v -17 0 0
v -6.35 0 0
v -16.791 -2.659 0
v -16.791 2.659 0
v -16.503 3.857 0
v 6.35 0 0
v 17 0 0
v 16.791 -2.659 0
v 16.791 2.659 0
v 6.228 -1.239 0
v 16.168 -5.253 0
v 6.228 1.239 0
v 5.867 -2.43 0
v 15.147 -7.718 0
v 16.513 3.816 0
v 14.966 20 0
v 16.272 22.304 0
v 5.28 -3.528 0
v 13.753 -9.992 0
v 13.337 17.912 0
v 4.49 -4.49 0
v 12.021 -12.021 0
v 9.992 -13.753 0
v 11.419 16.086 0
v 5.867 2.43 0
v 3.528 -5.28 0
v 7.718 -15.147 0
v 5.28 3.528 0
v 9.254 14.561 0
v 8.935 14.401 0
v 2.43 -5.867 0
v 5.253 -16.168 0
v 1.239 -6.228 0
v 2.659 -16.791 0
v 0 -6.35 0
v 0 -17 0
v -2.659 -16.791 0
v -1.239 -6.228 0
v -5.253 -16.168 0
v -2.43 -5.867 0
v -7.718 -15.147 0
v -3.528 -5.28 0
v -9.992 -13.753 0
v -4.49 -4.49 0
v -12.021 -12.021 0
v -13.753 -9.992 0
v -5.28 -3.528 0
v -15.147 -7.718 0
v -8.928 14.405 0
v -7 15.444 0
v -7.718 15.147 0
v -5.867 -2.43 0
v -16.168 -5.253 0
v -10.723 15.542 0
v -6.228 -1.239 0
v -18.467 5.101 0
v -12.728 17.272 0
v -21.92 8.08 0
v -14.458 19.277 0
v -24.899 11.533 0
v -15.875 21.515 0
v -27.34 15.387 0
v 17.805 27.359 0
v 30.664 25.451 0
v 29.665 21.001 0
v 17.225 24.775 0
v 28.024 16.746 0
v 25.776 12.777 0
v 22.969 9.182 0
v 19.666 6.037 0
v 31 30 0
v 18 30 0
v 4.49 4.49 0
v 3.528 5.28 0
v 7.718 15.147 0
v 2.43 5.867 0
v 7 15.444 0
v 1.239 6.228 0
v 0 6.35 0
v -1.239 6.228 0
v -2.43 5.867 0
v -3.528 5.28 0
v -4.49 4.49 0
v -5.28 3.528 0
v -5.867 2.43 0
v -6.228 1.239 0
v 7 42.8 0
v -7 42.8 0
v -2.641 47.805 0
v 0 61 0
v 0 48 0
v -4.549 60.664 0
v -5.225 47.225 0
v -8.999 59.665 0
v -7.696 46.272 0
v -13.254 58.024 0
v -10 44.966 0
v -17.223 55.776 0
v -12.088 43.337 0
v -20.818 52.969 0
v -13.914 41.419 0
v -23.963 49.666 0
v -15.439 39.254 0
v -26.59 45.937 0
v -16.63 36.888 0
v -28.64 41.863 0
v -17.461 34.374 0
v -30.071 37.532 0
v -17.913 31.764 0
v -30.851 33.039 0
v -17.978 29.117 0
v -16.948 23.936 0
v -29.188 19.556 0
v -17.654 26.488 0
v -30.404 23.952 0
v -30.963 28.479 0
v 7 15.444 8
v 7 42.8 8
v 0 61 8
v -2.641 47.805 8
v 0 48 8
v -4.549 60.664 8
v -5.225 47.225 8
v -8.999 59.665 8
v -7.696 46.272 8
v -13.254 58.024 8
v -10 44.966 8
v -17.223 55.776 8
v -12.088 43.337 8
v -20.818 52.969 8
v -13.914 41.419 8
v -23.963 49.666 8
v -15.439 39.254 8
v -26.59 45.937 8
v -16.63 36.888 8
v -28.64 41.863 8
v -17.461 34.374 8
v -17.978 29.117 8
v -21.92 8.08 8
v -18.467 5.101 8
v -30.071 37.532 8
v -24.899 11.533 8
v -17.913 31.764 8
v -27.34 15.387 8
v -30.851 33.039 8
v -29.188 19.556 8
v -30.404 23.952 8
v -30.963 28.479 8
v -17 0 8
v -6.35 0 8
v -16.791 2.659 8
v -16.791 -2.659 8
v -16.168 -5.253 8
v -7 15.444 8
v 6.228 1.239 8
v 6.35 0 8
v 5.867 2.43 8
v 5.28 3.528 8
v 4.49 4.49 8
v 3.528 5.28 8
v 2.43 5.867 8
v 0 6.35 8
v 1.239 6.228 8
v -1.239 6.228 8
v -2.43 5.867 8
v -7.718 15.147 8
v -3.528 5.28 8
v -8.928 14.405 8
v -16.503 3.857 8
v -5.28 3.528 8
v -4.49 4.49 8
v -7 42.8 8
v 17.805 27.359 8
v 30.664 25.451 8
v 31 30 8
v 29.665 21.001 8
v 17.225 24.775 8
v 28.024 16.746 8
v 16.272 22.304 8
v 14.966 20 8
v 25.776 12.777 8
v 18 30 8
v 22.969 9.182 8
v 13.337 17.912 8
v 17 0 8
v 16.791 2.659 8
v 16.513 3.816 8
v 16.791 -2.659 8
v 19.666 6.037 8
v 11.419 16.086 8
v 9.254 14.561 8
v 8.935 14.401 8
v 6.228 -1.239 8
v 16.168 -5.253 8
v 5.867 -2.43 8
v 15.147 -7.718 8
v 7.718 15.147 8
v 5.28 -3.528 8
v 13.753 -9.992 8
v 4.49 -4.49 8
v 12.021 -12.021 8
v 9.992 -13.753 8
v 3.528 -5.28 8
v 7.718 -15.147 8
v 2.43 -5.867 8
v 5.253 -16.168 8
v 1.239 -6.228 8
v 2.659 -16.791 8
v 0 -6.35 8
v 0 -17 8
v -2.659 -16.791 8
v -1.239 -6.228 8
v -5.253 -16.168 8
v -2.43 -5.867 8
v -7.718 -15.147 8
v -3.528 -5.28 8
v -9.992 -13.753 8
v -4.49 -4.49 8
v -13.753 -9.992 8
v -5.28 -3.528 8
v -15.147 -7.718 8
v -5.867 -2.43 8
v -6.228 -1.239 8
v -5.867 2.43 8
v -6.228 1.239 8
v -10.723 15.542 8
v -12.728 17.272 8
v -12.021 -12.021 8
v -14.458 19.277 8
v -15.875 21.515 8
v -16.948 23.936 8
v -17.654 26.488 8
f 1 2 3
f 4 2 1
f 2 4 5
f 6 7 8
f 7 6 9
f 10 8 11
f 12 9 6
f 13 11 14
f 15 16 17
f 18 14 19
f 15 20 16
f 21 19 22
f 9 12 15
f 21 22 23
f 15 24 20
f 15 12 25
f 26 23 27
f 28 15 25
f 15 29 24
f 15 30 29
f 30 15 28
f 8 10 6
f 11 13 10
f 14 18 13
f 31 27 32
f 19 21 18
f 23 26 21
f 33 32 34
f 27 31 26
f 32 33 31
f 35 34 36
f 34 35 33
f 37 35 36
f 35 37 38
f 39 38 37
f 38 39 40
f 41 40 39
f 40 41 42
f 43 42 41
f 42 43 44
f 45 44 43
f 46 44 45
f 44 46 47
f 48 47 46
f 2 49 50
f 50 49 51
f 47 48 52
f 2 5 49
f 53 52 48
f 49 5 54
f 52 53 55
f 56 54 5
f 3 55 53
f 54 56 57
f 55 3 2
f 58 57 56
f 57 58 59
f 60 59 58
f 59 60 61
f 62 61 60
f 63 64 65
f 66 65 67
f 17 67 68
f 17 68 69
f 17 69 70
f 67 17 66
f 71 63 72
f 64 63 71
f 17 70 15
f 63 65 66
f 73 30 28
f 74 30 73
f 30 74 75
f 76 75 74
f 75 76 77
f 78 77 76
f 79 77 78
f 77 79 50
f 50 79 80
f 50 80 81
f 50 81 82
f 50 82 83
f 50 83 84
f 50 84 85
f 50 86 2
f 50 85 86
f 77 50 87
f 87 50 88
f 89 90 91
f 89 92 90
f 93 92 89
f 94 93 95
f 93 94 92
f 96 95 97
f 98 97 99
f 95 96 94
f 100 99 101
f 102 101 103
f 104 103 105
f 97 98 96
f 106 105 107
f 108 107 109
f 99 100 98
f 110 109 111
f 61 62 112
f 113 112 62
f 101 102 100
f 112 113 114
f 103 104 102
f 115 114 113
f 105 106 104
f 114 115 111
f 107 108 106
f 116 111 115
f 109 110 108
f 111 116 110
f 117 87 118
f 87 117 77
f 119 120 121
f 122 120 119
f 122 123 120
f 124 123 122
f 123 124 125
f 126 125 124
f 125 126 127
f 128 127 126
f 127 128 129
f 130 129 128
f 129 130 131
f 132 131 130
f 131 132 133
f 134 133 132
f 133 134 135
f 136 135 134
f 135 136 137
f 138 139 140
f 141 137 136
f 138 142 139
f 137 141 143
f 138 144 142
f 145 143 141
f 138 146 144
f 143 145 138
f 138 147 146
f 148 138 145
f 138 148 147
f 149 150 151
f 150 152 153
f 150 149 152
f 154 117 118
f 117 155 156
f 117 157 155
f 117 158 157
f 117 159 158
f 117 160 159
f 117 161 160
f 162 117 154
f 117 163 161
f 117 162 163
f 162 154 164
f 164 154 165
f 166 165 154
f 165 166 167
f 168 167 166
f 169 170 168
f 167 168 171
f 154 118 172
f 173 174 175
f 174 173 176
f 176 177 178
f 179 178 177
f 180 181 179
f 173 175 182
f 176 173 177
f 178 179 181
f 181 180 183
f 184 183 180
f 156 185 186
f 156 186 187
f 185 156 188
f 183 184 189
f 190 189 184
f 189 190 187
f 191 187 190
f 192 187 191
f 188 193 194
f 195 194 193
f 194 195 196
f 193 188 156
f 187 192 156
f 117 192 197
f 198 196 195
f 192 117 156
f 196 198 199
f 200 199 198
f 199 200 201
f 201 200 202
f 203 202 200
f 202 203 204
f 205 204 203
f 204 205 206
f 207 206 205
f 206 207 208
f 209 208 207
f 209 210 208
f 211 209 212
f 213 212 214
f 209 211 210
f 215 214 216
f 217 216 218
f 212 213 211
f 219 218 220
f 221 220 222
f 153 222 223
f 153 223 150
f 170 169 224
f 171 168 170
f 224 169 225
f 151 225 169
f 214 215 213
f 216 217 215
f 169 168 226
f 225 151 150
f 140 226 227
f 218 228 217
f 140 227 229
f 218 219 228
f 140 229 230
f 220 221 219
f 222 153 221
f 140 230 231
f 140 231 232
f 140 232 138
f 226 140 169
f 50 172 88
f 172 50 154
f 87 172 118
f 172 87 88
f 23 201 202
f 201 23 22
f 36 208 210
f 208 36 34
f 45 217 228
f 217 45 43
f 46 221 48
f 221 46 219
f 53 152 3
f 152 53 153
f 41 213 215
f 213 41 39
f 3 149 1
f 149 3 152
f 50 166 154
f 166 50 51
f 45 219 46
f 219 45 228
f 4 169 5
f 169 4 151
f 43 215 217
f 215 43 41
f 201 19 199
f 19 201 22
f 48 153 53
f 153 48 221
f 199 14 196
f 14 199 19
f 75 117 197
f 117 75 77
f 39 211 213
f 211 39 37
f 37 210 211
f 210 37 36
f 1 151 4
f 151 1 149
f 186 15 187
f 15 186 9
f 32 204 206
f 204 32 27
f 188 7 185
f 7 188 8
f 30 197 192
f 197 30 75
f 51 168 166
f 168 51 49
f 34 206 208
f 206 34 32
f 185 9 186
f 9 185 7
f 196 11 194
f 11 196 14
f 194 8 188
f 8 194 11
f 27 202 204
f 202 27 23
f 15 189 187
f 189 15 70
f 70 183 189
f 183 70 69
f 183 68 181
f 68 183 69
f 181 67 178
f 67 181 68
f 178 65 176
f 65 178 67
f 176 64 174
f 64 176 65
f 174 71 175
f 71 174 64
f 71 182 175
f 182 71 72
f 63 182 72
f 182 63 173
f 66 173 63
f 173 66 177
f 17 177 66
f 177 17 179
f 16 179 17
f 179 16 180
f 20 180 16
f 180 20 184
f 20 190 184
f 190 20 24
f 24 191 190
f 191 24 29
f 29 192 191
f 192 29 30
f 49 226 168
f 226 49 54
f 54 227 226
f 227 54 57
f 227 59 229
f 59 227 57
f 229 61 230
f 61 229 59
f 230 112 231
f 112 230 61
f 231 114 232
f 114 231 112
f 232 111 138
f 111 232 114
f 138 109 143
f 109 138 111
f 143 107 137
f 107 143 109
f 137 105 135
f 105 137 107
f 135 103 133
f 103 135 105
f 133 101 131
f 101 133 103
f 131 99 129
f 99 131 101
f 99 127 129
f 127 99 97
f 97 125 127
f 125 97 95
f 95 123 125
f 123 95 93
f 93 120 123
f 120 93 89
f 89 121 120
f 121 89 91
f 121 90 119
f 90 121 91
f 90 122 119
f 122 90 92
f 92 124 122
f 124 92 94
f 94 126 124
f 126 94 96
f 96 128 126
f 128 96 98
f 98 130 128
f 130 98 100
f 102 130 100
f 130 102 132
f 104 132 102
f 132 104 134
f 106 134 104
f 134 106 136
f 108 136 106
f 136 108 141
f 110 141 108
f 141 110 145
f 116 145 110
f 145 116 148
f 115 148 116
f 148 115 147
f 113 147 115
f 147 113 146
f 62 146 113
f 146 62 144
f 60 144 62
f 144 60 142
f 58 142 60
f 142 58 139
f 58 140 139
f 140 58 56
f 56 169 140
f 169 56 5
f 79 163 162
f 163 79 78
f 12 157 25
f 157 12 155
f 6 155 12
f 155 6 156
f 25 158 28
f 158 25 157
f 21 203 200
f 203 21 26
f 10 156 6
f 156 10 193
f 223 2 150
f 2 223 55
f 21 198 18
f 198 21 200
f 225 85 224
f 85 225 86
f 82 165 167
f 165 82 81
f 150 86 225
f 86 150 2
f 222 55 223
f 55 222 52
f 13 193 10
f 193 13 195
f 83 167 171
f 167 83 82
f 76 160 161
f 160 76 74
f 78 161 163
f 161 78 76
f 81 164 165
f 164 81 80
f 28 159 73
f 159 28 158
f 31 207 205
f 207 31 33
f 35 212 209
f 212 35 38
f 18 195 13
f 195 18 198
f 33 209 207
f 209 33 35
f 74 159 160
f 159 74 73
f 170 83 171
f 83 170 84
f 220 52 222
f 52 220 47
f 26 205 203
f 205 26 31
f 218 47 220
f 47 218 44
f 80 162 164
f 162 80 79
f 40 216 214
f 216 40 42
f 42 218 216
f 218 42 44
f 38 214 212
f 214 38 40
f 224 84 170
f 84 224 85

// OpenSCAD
$fn = 32;

// ----------------------------------------------------------------------
// Hook: 60 mm shank into a 18 mm curl, 8 mm thick
// ----------------------------------------------------------------------

// --- parameters (mm) ---
shank_len = 60;           // shank length from the boss centre
shank_w = 14;             // shank width
boss_d = 34;              // boss diameter
bore_d = 12.7;            // boss bore
curl_in = 18;             // curl inner radius
curl_out = 31;            // curl outer radius
curl_sweep = 270;         // curl sweep angle
hook_t = 8;               // hook thickness

shank_profile = [[-7, 42.8], [7, 42.8], [7, 15], [-7, 15]];
boss_profile = [[17, 0], [16.791, 2.659], [16.168, 5.253], [15.147, 7.718], [13.753, 9.992], [12.021, 12.021], [9.992, 13.753], [7.718, 15.147], [5.253, 16.168], [2.659, 16.791], [0, 17], [-2.659, 16.791], [-5.253, 16.168], [-7.718, 15.147], [-9.992, 13.753], [-12.021, 12.021], [-13.753, 9.992], [-15.147, 7.718], [-16.168, 5.253], [-16.791, 2.659], [-17, 0], [-16.791, -2.659], [-16.168, -5.253], [-15.147, -7.718], [-13.753, -9.992], [-12.021, -12.021], [-9.992, -13.753], [-7.718, -15.147], [-5.253, -16.168], [-2.659, -16.791], [0, -17], [2.659, -16.791], [5.253, -16.168], [7.718, -15.147], [9.992, -13.753], [12.021, -12.021], [13.753, -9.992], [15.147, -7.718], [16.168, -5.253], [16.791, -2.659]];
curl_profile = [[0, 61], [-4.549, 60.664], [-8.999, 59.665], [-13.254, 58.024], [-17.223, 55.776], [-20.818, 52.969], [-23.963, 49.666], [-26.59, 45.937], [-28.64, 41.863], [-30.071, 37.532], [-30.851, 33.039], [-30.963, 28.479], [-30.404, 23.952], [-29.188, 19.556], [-27.34, 15.387], [-24.899, 11.533], [-21.92, 8.08], [-18.467, 5.101], [-14.613, 2.66], [-10.444, 0.812], [-6.048, -0.404], [-1.521, -0.963], [3.039, -0.851], [7.532, -0.071], [11.863, 1.36], [15.937, 3.41], [19.666, 6.037], [22.969, 9.182], [25.776, 12.777], [28.024, 16.746], [29.665, 21.001], [30.664, 25.451], [31, 30], [18, 30], [17.805, 27.359], [17.225, 24.775], [16.272, 22.304], [14.966, 20], [13.337, 17.912], [11.419, 16.086], [9.254, 14.561], [6.888, 13.37], [4.374, 12.539], [1.764, 12.087], [-0.883, 12.022], [-3.512, 12.346], [-6.064, 13.052], [-8.485, 14.125], [-10.723, 15.542], [-12.728, 17.272], [-14.458, 19.277], [-15.875, 21.515], [-16.948, 23.936], [-17.654, 26.488], [-17.978, 29.117], [-17.913, 31.764], [-17.461, 34.374], [-16.63, 36.888], [-15.439, 39.254], [-13.914, 41.419], [-12.088, 43.337], [-10, 44.966], [-7.696, 46.272], [-5.225, 47.225], [-2.641, 47.805], [0, 48]];

difference() {
  union() {
    /* three overlapping outlines: shank, boss and the smooth curl */
    linear_extrude(height = hook_t) polygon(shank_profile);
    linear_extrude(height = hook_t) polygon(boss_profile);
    linear_extrude(height = hook_t) polygon(curl_profile);
  }
  translate([0, 0, -2.5]) cylinder(h = hook_t + 5, d = bore_d);
}
